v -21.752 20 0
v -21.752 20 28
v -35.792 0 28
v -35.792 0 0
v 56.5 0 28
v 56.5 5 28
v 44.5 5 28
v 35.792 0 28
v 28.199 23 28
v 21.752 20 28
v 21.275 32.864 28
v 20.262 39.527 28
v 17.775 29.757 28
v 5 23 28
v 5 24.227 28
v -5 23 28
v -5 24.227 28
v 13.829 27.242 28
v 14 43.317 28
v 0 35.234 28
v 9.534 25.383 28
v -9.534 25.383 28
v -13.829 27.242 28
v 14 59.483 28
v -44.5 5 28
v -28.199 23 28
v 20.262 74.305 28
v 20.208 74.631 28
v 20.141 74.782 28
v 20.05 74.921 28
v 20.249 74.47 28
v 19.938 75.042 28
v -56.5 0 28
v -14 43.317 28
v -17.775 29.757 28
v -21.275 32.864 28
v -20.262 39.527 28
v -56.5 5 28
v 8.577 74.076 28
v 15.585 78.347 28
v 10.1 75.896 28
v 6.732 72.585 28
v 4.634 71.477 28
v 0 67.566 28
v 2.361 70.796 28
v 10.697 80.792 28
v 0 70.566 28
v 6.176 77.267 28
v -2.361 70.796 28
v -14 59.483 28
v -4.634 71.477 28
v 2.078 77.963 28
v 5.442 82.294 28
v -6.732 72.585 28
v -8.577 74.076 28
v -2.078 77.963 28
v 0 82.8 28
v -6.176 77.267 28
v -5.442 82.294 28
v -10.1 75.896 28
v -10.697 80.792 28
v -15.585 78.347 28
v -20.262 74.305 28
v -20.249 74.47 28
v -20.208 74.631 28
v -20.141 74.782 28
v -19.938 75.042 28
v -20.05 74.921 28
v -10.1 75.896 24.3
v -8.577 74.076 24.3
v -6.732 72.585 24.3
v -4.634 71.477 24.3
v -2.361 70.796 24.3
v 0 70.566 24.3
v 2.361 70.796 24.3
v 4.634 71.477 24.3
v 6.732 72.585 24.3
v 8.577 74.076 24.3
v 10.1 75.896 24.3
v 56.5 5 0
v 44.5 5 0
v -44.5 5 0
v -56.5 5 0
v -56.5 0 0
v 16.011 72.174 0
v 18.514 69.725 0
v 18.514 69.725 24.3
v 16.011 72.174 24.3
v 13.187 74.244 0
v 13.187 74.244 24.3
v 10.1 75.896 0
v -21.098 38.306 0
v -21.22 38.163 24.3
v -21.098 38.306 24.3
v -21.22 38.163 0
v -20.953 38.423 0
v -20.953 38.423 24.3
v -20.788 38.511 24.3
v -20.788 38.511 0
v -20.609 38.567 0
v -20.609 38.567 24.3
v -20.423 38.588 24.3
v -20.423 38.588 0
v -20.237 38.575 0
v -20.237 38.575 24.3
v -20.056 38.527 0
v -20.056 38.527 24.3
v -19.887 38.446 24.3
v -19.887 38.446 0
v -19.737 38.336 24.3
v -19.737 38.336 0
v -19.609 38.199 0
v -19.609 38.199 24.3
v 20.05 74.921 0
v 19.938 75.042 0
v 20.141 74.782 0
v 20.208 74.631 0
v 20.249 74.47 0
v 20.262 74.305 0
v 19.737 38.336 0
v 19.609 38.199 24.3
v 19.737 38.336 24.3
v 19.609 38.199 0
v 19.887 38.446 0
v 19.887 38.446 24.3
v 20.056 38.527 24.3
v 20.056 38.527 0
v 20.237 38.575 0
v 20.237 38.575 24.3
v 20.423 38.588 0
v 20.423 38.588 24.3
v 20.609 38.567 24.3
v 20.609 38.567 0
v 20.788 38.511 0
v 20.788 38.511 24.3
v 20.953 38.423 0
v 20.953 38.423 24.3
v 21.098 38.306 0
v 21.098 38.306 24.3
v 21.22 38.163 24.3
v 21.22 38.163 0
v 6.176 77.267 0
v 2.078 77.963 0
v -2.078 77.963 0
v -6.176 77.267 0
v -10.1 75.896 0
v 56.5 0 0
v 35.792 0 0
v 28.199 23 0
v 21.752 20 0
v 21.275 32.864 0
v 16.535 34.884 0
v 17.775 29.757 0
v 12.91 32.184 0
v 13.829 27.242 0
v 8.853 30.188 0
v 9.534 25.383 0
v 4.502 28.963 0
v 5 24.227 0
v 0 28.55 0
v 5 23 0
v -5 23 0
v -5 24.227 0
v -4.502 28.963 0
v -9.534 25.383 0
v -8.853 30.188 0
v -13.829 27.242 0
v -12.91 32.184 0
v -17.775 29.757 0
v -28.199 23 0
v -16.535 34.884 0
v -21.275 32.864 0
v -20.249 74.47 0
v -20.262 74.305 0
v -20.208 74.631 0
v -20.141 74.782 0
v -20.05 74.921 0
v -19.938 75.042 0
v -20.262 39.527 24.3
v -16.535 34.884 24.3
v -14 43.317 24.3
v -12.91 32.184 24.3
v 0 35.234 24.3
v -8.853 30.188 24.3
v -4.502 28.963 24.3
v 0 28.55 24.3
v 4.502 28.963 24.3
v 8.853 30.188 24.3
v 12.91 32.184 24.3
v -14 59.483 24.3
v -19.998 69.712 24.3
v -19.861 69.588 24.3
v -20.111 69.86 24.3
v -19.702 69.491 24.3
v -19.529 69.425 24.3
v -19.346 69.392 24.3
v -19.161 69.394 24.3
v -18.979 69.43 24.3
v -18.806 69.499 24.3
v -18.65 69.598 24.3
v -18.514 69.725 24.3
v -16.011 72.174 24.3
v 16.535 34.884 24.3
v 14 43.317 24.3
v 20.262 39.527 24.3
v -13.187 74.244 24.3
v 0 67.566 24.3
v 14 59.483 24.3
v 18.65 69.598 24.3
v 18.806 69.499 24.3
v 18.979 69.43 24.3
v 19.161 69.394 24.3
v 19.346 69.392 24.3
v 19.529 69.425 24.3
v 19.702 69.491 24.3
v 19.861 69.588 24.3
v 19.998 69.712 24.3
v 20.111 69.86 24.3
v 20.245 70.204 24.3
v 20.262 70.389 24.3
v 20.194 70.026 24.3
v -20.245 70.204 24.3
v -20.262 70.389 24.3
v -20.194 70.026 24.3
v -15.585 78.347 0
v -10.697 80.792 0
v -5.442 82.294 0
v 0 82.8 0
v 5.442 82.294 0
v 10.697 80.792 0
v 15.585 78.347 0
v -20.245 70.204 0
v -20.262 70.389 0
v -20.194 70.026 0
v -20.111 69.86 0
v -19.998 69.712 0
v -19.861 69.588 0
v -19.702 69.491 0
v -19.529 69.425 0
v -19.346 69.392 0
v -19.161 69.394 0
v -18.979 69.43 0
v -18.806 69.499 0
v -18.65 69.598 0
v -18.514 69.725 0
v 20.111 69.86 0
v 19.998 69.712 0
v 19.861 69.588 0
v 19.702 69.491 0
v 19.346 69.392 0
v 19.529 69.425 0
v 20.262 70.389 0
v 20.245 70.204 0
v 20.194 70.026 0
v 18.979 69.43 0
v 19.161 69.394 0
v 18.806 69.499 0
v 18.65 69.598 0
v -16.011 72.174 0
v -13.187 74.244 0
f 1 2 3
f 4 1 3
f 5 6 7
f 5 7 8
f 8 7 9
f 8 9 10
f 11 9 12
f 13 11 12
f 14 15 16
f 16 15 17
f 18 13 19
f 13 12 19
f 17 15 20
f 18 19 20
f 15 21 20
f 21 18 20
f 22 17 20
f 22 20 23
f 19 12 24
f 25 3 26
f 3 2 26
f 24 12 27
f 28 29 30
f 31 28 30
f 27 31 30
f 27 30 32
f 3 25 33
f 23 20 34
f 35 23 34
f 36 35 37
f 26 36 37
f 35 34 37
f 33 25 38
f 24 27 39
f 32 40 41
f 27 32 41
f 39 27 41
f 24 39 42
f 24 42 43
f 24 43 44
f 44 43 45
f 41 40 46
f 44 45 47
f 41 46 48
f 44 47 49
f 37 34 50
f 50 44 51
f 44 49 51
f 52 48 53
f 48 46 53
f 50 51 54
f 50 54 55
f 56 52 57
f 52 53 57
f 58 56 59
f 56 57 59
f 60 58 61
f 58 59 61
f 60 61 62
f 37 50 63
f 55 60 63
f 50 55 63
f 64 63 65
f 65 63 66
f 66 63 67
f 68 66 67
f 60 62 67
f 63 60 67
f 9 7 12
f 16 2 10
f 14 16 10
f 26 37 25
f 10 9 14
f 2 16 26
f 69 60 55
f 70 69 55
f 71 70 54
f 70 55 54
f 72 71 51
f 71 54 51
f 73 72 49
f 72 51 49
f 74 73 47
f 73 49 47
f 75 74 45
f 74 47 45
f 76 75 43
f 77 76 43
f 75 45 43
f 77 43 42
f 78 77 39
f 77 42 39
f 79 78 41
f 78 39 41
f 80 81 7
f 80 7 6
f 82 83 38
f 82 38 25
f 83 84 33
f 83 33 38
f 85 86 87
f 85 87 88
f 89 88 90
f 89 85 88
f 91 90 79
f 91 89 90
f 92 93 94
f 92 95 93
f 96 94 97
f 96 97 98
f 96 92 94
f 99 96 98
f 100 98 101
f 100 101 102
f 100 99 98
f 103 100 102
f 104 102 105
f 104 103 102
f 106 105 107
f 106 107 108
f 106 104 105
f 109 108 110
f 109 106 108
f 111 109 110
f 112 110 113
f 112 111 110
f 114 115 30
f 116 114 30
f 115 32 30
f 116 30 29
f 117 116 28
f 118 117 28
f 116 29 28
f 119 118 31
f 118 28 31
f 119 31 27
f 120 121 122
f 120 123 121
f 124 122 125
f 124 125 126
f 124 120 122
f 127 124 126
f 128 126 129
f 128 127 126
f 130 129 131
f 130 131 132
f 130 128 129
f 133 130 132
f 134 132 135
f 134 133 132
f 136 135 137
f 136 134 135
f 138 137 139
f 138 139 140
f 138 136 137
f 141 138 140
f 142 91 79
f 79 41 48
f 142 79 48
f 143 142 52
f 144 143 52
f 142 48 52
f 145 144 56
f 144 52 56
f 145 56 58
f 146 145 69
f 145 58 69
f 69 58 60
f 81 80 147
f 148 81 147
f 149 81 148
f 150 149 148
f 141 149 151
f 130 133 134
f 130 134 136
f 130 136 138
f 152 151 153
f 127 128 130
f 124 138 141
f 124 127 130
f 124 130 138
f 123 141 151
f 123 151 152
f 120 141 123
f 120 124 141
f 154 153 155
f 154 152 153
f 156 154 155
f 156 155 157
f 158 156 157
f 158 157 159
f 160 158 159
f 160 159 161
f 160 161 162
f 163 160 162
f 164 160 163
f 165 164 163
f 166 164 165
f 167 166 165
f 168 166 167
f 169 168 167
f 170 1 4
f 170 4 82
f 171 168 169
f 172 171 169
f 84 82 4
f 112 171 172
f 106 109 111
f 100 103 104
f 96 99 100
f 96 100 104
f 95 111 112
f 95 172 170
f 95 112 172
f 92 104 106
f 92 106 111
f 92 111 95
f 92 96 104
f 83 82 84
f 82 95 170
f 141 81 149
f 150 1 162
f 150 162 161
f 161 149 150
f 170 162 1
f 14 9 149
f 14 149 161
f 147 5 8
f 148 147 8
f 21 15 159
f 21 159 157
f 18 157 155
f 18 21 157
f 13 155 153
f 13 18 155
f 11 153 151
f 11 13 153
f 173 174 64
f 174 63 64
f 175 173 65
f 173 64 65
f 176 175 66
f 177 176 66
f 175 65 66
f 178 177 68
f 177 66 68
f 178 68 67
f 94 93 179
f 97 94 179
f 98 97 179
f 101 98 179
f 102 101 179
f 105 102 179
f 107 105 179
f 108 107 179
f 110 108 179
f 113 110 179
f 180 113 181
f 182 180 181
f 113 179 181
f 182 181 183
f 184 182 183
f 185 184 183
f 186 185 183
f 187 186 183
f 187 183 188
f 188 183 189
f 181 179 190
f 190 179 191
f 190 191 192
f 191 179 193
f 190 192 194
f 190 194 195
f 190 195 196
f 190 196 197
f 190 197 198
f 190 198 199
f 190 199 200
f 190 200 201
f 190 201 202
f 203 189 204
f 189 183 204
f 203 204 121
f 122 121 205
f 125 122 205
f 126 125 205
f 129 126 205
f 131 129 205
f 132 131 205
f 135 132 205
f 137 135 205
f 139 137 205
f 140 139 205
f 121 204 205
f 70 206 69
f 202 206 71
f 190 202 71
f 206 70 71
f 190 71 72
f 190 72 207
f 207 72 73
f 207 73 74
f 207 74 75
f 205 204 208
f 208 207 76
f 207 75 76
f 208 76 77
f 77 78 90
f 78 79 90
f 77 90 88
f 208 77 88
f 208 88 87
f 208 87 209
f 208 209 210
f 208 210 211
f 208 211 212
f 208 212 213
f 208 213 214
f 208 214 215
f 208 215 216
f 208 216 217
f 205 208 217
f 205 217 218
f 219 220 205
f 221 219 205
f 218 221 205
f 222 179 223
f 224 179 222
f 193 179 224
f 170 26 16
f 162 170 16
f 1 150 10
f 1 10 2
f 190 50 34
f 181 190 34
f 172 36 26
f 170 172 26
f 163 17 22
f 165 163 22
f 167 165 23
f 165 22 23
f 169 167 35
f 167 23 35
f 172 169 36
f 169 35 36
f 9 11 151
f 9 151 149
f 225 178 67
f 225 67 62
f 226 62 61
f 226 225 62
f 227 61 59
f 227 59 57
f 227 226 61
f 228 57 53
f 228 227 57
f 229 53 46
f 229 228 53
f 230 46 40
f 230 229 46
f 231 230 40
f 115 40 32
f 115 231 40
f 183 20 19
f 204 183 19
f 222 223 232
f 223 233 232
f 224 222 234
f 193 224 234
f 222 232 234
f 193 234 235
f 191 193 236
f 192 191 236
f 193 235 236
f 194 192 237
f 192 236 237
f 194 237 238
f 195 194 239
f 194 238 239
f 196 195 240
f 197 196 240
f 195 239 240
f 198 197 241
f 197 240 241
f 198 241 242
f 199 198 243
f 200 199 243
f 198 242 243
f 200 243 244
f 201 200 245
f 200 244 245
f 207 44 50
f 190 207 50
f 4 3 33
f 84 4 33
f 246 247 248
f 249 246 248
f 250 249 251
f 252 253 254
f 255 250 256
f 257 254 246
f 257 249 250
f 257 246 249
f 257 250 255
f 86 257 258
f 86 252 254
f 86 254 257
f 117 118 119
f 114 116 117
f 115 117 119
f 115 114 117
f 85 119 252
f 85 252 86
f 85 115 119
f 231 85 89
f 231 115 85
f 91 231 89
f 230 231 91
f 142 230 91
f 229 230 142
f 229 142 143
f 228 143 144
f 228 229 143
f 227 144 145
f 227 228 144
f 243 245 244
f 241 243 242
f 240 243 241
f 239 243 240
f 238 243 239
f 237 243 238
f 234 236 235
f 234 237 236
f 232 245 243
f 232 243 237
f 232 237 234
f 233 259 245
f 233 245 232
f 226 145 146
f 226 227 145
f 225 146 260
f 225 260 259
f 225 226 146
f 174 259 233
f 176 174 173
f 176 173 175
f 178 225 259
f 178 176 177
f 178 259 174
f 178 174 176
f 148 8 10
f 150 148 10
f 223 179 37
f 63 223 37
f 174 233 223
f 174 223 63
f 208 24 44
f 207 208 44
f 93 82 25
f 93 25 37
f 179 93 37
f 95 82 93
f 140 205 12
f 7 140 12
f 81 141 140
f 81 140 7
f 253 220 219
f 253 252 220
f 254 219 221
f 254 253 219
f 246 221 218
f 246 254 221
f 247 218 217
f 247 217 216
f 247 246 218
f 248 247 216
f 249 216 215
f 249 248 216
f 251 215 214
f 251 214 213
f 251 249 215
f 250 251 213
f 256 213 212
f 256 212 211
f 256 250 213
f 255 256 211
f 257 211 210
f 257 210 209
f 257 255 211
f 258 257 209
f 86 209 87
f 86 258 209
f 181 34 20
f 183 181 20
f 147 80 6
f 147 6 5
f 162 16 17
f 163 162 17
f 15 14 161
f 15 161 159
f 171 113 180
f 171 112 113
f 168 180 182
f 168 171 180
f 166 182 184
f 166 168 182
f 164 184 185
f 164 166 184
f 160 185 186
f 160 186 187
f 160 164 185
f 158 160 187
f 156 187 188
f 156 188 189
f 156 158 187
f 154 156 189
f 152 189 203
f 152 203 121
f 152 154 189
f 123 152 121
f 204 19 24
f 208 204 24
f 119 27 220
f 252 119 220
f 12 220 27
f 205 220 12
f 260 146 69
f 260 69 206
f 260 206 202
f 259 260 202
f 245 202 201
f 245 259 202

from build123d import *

# Parameters (mm, degrees)
BOSS_EXTRU_1_DEPTH      = 28
ESQUISSE2_R             = 24.75
ENL_V_MAT_EXTRU_1_DEPTH = 24.3
ENL_V_MAT_EXTRU_6_DEPTH = 29
CONG_1_R                = 1


with BuildPart() as part:
    # Esquisse1 → Boss.-Extru.1 (new body)
    with BuildSketch(Plane.XY):
        with BuildLine():
            Line((-56.5, 0), (-56.5, 5))
            Line((-56.5, 5), (-44.5, 5))
            Line((-44.5, 5), (-20.262248583, 39.527154166))
            Line((-20.262248583, 39.527154166), (-20.262248583, 74.740412365))
            ThreePointArc((-20.262248583, 74.740412365), (0, 82.8), (20.262248583, 74.740412365))
            Line((20.262248583, 74.740412365), (20.262248583, 39.527154166))
            Line((20.262248583, 39.527154166), (44.5, 5))
            Line((44.5, 5), (56.5, 5))
            Line((56.5, 5), (56.5, 0))
            Line((56.5, 0), (35.791970863, 0))
            Line((35.791970863, 0), (21.7521509, 20))
            Line((21.7521509, 20), (-21.7521509, 20))
            Line((-21.7521509, 20), (-35.791970863, 0))
            Line((-35.791970863, 0), (-56.5, 0))
        make_face()
    extrude(amount=BOSS_EXTRU_1_DEPTH)

    # Esquisse2 → Enlèv. mat.-Extru.1 (cut)
    with BuildSketch(Plane.XY):
        with Locations((0, 53.3)):
            Circle(ESQUISSE2_R)
    extrude(amount=ENL_V_MAT_EXTRU_1_DEPTH, mode=Mode.SUBTRACT)

    # Esquisse5 → Enlèv. mat.-Extru.6 (cut, through all)
    with BuildSketch(Plane.XY.offset(28)):
        Polygon((0, 67.565807537), (-14, 59.482903769), (-14, 43.317096231), (0, 35.234192463), (14, 43.317096231), (14, 59.482903769), align=None)
        with BuildLine():
            Line((-21.274554731, 32.863676431), (-28.198766795, 23))
            Line((-28.198766795, 23), (-5, 23))
            Line((-5, 23), (-5, 24.22681648))
            ThreePointArc((-5, 24.22681648), (-13.828842831, 27.242120079), (-21.274554731, 32.863676431))
        make_face()
        with BuildLine():
            Line((21.274554731, 32.863676431), (28.198766795, 23))
            Line((28.198766795, 23), (5, 23))
            Line((5, 23), (5, 24.22681648))
            ThreePointArc((5, 24.22681648), (13.828842831, 27.242120079), (21.274554731, 32.863676431))
        make_face()
        with BuildLine():
            ThreePointArc((-10.099699908, 75.895542962), (0, 70.565807537), (10.099699908, 75.895542962))
            ThreePointArc((10.099699908, 75.895542962), (0, 78.05), (-10.099699908, 75.895542962))
        make_face()
    extrude(amount=-ENL_V_MAT_EXTRU_6_DEPTH, mode=Mode.SUBTRACT)

    # Congé1
    cong_1_edges = [part.edges().sort_by_distance(p)[0] for p in [
        (-20.262248583, 74.740412365, 14),
        (20.262248583, 74.740412365, 14),
        (20.415715975, 39.308536844, 12.15),
        (20.262248583, 67.512803466, 12.15),
        (-20.262248583, 67.512803466, 12.15),
        (-20.415715975, 39.308536844, 12.15),
    ]]
    fillet(cong_1_edges, radius=CONG_1_R)


solid = part.part
